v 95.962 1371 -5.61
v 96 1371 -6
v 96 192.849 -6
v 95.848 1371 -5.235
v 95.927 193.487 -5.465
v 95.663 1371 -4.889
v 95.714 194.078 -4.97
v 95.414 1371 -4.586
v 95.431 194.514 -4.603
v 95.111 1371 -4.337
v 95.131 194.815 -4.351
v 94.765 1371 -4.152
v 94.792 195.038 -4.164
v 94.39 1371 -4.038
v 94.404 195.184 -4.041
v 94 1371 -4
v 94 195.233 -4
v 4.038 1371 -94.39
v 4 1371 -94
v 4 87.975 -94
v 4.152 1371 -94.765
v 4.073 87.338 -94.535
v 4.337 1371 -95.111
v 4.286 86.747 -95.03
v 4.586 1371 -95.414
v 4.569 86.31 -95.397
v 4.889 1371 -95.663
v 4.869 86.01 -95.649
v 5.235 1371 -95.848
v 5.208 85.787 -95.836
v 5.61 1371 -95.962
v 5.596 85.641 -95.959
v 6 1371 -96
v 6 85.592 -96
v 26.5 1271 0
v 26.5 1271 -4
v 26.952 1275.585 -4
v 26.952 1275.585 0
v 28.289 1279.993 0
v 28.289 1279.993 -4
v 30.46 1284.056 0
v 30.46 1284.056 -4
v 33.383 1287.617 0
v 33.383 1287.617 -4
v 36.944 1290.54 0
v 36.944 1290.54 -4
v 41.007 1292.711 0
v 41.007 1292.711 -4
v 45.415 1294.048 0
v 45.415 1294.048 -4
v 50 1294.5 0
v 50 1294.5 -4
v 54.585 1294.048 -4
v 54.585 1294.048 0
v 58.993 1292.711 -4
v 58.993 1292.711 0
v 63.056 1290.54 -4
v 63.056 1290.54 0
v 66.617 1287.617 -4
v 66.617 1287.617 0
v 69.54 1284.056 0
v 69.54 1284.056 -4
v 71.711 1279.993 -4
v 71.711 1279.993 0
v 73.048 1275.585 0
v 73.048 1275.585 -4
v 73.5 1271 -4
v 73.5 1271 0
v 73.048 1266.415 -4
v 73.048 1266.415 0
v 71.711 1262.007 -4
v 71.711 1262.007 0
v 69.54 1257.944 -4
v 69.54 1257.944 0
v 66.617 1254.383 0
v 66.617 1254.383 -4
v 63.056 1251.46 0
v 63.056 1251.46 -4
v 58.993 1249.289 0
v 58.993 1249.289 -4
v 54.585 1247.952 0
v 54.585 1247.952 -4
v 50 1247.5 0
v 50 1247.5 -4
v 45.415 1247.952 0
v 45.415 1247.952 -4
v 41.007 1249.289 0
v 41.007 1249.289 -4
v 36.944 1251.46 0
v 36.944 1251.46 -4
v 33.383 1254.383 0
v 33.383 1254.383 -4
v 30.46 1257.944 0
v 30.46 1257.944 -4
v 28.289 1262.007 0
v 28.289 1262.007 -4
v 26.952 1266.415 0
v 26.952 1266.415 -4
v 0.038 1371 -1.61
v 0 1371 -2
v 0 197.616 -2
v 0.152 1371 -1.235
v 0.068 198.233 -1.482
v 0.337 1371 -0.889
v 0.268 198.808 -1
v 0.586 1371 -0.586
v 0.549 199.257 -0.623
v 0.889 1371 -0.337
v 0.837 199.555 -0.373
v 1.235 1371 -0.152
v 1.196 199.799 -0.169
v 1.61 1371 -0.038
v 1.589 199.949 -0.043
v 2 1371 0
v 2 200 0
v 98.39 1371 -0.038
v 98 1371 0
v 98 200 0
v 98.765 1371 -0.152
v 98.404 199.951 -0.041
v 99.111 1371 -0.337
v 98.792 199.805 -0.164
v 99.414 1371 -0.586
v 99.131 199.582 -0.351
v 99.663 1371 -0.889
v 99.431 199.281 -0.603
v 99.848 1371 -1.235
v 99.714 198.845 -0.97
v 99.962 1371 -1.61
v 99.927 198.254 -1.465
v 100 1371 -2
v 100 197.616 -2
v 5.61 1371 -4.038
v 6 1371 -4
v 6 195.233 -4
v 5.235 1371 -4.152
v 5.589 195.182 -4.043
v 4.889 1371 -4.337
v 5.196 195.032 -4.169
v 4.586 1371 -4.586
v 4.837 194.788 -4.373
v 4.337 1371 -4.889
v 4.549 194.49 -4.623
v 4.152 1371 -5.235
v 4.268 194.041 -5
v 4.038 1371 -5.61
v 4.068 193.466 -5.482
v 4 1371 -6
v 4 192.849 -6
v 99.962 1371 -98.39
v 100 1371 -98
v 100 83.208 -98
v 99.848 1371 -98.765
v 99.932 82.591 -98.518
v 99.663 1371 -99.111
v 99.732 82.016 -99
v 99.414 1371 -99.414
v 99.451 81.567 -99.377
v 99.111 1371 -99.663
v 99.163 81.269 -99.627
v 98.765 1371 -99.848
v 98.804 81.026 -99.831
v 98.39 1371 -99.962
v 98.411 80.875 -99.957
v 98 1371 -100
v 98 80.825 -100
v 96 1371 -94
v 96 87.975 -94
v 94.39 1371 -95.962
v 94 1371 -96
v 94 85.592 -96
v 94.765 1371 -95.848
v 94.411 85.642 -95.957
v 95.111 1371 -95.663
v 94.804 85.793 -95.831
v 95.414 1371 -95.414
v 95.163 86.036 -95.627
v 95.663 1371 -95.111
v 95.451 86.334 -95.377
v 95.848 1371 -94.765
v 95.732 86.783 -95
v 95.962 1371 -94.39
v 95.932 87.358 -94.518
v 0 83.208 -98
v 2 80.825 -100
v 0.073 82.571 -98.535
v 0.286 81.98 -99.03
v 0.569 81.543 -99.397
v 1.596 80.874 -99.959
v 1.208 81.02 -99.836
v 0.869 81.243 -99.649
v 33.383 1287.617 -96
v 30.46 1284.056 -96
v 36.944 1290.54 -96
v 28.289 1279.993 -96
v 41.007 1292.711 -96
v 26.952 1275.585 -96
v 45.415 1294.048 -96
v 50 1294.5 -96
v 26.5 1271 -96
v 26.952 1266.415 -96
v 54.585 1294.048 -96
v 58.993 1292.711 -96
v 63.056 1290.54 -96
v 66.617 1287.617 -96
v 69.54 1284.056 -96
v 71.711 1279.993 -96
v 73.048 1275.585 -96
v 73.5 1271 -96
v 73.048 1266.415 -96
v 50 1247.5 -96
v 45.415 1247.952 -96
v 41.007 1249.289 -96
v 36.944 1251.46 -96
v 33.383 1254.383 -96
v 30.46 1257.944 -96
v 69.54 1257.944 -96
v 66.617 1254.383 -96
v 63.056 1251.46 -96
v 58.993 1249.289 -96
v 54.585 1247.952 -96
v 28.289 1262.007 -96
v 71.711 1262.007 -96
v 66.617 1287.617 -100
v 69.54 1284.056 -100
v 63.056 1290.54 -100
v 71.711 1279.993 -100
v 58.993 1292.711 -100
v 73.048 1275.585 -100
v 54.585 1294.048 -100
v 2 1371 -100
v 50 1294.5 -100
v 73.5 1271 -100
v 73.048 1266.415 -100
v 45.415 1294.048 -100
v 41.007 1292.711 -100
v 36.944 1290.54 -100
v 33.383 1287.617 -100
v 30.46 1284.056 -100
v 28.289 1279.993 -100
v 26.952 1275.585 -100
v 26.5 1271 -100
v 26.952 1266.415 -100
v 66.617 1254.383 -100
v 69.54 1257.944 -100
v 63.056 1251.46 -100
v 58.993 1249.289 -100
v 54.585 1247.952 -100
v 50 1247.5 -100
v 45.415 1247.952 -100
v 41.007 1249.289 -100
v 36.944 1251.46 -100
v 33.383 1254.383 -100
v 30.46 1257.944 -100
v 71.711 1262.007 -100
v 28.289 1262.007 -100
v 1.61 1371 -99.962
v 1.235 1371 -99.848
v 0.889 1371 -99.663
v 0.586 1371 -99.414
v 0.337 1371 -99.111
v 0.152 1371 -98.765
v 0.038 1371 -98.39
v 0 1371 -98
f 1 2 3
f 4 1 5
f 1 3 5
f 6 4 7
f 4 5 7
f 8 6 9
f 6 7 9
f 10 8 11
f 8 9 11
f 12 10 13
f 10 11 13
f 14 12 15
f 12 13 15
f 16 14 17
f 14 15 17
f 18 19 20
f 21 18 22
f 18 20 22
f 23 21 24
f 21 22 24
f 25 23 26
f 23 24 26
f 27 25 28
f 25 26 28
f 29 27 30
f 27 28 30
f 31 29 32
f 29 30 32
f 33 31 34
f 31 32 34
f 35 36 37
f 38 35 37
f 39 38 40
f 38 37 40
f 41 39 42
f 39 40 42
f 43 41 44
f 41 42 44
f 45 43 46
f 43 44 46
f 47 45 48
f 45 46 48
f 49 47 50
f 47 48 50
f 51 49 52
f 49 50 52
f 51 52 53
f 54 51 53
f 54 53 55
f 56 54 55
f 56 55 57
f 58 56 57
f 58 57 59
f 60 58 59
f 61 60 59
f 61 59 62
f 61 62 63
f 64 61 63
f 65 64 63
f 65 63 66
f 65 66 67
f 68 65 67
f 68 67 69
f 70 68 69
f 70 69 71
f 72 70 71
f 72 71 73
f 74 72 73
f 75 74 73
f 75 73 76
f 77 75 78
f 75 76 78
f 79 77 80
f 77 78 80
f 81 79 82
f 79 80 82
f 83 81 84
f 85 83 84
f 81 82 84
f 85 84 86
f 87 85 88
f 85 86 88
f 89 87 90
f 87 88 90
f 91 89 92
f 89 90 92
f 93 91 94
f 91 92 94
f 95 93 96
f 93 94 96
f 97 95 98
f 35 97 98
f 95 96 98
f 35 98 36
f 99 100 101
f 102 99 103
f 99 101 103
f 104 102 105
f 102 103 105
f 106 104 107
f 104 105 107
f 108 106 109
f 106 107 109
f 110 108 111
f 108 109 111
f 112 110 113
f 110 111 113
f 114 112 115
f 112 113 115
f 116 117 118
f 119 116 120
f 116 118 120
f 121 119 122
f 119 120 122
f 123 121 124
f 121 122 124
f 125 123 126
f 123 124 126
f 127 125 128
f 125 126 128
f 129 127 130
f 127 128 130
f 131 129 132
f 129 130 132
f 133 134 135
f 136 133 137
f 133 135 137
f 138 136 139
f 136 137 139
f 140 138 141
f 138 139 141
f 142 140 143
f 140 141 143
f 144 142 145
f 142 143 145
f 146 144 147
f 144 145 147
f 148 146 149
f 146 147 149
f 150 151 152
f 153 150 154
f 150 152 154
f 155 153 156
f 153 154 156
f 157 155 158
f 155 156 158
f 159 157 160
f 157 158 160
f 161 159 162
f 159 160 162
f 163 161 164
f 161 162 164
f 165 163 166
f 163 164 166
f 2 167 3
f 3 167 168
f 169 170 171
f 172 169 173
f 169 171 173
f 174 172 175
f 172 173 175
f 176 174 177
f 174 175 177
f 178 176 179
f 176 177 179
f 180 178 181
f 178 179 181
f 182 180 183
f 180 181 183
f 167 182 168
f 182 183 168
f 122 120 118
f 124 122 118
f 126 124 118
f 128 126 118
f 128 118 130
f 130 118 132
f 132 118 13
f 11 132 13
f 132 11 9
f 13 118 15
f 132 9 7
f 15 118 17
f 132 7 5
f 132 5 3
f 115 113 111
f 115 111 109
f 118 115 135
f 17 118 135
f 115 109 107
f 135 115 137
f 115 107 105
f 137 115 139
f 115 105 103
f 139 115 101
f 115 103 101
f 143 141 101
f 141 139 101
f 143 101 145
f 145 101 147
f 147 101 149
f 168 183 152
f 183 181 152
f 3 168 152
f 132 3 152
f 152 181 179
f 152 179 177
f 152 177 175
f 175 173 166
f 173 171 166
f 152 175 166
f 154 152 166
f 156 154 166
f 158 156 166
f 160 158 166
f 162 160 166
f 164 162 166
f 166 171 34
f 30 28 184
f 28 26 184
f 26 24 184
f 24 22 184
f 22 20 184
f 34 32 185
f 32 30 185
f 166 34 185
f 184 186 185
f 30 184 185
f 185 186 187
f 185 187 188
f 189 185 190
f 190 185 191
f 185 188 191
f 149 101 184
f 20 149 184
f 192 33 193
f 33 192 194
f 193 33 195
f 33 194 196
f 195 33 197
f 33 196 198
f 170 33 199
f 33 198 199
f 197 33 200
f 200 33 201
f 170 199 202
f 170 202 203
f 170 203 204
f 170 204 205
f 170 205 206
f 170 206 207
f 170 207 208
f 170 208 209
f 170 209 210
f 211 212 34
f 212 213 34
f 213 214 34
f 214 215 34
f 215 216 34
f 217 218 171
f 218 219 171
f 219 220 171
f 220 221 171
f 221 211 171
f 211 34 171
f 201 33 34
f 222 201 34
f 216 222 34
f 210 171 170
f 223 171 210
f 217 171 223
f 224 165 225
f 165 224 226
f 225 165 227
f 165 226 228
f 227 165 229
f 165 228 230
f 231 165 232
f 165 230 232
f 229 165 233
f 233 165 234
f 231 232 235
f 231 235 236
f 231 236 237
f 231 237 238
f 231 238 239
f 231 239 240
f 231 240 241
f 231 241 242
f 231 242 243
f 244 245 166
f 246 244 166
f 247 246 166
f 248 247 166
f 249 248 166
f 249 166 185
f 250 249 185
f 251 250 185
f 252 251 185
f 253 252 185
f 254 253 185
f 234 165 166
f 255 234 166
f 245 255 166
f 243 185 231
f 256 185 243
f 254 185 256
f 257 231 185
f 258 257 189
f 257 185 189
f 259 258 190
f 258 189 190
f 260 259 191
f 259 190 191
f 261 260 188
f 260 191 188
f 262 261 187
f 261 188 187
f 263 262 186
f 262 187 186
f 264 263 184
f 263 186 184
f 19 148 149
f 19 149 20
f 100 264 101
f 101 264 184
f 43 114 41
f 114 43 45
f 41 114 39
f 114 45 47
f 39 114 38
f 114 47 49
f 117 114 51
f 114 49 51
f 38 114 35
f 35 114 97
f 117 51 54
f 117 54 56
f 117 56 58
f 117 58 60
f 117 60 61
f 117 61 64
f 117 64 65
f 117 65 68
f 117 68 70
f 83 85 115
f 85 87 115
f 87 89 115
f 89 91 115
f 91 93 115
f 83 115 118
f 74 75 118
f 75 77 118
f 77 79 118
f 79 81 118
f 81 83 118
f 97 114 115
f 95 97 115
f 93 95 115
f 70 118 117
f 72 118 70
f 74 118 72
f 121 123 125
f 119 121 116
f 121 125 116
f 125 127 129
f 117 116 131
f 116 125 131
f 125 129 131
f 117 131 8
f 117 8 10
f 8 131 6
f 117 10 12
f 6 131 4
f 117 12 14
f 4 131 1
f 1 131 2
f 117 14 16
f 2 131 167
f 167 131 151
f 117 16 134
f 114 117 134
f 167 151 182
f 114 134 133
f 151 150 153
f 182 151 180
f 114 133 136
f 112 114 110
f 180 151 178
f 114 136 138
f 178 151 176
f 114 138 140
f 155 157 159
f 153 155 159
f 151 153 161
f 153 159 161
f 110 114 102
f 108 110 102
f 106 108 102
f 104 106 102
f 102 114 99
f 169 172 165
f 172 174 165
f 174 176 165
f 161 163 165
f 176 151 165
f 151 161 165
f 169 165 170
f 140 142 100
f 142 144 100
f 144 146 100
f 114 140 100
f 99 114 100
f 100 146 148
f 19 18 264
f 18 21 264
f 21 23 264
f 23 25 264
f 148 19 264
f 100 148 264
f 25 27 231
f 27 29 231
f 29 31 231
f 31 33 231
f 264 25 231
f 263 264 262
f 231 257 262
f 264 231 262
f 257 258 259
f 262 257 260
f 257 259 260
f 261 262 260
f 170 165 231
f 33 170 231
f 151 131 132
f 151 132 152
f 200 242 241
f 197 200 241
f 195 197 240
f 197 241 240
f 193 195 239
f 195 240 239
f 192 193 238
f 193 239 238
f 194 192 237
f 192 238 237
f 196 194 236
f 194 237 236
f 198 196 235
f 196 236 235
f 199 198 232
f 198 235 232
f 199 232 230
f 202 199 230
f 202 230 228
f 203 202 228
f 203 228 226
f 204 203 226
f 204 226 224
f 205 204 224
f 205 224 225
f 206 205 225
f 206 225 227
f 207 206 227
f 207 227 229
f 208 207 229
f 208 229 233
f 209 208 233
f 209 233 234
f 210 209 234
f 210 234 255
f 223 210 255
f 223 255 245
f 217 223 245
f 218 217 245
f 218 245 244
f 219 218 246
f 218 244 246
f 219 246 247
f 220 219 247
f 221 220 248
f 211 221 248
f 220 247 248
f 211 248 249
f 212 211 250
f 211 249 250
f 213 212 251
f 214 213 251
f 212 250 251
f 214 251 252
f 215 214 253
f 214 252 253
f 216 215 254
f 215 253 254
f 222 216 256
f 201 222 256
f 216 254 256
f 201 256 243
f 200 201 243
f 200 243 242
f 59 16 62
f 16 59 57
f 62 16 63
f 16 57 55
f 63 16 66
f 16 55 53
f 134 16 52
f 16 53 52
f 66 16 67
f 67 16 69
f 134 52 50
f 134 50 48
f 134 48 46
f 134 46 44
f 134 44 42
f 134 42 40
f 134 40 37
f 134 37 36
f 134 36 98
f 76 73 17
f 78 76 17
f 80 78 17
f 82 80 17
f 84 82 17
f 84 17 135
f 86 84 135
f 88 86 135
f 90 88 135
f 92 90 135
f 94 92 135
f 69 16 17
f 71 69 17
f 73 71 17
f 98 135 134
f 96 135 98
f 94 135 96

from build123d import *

# Parameters (mm, degrees)
BOSS_EXTRU_1_DEPTH      = 1500
ENL_V_MAT_EXTRU_1_DEPTH = 1507.651917332
ESQUISSE5_R             = 23.5
ENL_V_MAT_EXTRU_2_DEPTH = 1507.651917332
ESQUISSE6_W             = 100
ESQUISSE6_H             = 129
ENL_V_MAT_EXTRU_3_DEPTH = 1507.651917332


with BuildPart() as part:
    # Esquisse2 → Boss.-Extru.1 (new body)
    with BuildSketch(Plane(origin=(0, 0, 0), x_dir=(1, 0, 0), z_dir=(0, 1, 0))):
        with BuildLine():
            Line((2, 0), (98, 0))
            ThreePointArc((98, 0), (99.414213562, 0.585786438), (100, 2))
            Line((100, 2), (100, 98))
            ThreePointArc((100, 98), (99.414213562, 99.414213562), (98, 100))
            Line((98, 100), (2, 100))
            ThreePointArc((2, 100), (0.585786438, 99.414213562), (0, 98))
            Line((0, 98), (0, 2))
            ThreePointArc((0, 2), (0.585786438, 0.585786438), (2, 0))
        make_face()
        with BuildLine():
            Line((6, 96), (94, 96))
            ThreePointArc((94, 96), (95.414213562, 95.414213562), (96, 94))
            Line((96, 94), (96, 6))
            ThreePointArc((96, 6), (95.414213562, 4.585786438), (94, 4))
            Line((94, 4), (6, 4))
            ThreePointArc((6, 4), (4.585786438, 4.585786438), (4, 6))
            Line((4, 6), (4, 94))
            ThreePointArc((4, 94), (4.585786438, 95.414213562), (6, 96))
        make_face(mode=Mode.SUBTRACT)
    extrude(amount=BOSS_EXTRU_1_DEPTH)

    # Esquisse4 → Enlèv. mat.-Extru.1 (cut, through all)
    with BuildSketch(Plane.ZY):
        Polygon((0, 200), (-206.800963523, -46.455791231), (114.552024245, -46.455791231), (114.552024245, 200), align=None)
    extrude(amount=-ENL_V_MAT_EXTRU_1_DEPTH, mode=Mode.SUBTRACT)

    # Esquisse5 → Enlèv. mat.-Extru.2 (cut, through all)
    with BuildSketch(Plane(origin=(0, 0, -100), x_dir=(-1, 0, 0), z_dir=(0, 0, -1))):
        with Locations((-50, 1271)):
            Circle(ESQUISSE5_R)
    extrude(amount=-ENL_V_MAT_EXTRU_2_DEPTH, mode=Mode.SUBTRACT)

    # Esquisse6 → Enlèv. mat.-Extru.3 (cut, through all)
    with BuildSketch(Plane(origin=(0, 0, -100), x_dir=(-1, 0, 0), z_dir=(0, 0, -1))):
        with Locations((-50, 1435.5)):
            Rectangle(ESQUISSE6_W, ESQUISSE6_H)
    extrude(amount=-ENL_V_MAT_EXTRU_3_DEPTH, mode=Mode.SUBTRACT)


solid = part.part
